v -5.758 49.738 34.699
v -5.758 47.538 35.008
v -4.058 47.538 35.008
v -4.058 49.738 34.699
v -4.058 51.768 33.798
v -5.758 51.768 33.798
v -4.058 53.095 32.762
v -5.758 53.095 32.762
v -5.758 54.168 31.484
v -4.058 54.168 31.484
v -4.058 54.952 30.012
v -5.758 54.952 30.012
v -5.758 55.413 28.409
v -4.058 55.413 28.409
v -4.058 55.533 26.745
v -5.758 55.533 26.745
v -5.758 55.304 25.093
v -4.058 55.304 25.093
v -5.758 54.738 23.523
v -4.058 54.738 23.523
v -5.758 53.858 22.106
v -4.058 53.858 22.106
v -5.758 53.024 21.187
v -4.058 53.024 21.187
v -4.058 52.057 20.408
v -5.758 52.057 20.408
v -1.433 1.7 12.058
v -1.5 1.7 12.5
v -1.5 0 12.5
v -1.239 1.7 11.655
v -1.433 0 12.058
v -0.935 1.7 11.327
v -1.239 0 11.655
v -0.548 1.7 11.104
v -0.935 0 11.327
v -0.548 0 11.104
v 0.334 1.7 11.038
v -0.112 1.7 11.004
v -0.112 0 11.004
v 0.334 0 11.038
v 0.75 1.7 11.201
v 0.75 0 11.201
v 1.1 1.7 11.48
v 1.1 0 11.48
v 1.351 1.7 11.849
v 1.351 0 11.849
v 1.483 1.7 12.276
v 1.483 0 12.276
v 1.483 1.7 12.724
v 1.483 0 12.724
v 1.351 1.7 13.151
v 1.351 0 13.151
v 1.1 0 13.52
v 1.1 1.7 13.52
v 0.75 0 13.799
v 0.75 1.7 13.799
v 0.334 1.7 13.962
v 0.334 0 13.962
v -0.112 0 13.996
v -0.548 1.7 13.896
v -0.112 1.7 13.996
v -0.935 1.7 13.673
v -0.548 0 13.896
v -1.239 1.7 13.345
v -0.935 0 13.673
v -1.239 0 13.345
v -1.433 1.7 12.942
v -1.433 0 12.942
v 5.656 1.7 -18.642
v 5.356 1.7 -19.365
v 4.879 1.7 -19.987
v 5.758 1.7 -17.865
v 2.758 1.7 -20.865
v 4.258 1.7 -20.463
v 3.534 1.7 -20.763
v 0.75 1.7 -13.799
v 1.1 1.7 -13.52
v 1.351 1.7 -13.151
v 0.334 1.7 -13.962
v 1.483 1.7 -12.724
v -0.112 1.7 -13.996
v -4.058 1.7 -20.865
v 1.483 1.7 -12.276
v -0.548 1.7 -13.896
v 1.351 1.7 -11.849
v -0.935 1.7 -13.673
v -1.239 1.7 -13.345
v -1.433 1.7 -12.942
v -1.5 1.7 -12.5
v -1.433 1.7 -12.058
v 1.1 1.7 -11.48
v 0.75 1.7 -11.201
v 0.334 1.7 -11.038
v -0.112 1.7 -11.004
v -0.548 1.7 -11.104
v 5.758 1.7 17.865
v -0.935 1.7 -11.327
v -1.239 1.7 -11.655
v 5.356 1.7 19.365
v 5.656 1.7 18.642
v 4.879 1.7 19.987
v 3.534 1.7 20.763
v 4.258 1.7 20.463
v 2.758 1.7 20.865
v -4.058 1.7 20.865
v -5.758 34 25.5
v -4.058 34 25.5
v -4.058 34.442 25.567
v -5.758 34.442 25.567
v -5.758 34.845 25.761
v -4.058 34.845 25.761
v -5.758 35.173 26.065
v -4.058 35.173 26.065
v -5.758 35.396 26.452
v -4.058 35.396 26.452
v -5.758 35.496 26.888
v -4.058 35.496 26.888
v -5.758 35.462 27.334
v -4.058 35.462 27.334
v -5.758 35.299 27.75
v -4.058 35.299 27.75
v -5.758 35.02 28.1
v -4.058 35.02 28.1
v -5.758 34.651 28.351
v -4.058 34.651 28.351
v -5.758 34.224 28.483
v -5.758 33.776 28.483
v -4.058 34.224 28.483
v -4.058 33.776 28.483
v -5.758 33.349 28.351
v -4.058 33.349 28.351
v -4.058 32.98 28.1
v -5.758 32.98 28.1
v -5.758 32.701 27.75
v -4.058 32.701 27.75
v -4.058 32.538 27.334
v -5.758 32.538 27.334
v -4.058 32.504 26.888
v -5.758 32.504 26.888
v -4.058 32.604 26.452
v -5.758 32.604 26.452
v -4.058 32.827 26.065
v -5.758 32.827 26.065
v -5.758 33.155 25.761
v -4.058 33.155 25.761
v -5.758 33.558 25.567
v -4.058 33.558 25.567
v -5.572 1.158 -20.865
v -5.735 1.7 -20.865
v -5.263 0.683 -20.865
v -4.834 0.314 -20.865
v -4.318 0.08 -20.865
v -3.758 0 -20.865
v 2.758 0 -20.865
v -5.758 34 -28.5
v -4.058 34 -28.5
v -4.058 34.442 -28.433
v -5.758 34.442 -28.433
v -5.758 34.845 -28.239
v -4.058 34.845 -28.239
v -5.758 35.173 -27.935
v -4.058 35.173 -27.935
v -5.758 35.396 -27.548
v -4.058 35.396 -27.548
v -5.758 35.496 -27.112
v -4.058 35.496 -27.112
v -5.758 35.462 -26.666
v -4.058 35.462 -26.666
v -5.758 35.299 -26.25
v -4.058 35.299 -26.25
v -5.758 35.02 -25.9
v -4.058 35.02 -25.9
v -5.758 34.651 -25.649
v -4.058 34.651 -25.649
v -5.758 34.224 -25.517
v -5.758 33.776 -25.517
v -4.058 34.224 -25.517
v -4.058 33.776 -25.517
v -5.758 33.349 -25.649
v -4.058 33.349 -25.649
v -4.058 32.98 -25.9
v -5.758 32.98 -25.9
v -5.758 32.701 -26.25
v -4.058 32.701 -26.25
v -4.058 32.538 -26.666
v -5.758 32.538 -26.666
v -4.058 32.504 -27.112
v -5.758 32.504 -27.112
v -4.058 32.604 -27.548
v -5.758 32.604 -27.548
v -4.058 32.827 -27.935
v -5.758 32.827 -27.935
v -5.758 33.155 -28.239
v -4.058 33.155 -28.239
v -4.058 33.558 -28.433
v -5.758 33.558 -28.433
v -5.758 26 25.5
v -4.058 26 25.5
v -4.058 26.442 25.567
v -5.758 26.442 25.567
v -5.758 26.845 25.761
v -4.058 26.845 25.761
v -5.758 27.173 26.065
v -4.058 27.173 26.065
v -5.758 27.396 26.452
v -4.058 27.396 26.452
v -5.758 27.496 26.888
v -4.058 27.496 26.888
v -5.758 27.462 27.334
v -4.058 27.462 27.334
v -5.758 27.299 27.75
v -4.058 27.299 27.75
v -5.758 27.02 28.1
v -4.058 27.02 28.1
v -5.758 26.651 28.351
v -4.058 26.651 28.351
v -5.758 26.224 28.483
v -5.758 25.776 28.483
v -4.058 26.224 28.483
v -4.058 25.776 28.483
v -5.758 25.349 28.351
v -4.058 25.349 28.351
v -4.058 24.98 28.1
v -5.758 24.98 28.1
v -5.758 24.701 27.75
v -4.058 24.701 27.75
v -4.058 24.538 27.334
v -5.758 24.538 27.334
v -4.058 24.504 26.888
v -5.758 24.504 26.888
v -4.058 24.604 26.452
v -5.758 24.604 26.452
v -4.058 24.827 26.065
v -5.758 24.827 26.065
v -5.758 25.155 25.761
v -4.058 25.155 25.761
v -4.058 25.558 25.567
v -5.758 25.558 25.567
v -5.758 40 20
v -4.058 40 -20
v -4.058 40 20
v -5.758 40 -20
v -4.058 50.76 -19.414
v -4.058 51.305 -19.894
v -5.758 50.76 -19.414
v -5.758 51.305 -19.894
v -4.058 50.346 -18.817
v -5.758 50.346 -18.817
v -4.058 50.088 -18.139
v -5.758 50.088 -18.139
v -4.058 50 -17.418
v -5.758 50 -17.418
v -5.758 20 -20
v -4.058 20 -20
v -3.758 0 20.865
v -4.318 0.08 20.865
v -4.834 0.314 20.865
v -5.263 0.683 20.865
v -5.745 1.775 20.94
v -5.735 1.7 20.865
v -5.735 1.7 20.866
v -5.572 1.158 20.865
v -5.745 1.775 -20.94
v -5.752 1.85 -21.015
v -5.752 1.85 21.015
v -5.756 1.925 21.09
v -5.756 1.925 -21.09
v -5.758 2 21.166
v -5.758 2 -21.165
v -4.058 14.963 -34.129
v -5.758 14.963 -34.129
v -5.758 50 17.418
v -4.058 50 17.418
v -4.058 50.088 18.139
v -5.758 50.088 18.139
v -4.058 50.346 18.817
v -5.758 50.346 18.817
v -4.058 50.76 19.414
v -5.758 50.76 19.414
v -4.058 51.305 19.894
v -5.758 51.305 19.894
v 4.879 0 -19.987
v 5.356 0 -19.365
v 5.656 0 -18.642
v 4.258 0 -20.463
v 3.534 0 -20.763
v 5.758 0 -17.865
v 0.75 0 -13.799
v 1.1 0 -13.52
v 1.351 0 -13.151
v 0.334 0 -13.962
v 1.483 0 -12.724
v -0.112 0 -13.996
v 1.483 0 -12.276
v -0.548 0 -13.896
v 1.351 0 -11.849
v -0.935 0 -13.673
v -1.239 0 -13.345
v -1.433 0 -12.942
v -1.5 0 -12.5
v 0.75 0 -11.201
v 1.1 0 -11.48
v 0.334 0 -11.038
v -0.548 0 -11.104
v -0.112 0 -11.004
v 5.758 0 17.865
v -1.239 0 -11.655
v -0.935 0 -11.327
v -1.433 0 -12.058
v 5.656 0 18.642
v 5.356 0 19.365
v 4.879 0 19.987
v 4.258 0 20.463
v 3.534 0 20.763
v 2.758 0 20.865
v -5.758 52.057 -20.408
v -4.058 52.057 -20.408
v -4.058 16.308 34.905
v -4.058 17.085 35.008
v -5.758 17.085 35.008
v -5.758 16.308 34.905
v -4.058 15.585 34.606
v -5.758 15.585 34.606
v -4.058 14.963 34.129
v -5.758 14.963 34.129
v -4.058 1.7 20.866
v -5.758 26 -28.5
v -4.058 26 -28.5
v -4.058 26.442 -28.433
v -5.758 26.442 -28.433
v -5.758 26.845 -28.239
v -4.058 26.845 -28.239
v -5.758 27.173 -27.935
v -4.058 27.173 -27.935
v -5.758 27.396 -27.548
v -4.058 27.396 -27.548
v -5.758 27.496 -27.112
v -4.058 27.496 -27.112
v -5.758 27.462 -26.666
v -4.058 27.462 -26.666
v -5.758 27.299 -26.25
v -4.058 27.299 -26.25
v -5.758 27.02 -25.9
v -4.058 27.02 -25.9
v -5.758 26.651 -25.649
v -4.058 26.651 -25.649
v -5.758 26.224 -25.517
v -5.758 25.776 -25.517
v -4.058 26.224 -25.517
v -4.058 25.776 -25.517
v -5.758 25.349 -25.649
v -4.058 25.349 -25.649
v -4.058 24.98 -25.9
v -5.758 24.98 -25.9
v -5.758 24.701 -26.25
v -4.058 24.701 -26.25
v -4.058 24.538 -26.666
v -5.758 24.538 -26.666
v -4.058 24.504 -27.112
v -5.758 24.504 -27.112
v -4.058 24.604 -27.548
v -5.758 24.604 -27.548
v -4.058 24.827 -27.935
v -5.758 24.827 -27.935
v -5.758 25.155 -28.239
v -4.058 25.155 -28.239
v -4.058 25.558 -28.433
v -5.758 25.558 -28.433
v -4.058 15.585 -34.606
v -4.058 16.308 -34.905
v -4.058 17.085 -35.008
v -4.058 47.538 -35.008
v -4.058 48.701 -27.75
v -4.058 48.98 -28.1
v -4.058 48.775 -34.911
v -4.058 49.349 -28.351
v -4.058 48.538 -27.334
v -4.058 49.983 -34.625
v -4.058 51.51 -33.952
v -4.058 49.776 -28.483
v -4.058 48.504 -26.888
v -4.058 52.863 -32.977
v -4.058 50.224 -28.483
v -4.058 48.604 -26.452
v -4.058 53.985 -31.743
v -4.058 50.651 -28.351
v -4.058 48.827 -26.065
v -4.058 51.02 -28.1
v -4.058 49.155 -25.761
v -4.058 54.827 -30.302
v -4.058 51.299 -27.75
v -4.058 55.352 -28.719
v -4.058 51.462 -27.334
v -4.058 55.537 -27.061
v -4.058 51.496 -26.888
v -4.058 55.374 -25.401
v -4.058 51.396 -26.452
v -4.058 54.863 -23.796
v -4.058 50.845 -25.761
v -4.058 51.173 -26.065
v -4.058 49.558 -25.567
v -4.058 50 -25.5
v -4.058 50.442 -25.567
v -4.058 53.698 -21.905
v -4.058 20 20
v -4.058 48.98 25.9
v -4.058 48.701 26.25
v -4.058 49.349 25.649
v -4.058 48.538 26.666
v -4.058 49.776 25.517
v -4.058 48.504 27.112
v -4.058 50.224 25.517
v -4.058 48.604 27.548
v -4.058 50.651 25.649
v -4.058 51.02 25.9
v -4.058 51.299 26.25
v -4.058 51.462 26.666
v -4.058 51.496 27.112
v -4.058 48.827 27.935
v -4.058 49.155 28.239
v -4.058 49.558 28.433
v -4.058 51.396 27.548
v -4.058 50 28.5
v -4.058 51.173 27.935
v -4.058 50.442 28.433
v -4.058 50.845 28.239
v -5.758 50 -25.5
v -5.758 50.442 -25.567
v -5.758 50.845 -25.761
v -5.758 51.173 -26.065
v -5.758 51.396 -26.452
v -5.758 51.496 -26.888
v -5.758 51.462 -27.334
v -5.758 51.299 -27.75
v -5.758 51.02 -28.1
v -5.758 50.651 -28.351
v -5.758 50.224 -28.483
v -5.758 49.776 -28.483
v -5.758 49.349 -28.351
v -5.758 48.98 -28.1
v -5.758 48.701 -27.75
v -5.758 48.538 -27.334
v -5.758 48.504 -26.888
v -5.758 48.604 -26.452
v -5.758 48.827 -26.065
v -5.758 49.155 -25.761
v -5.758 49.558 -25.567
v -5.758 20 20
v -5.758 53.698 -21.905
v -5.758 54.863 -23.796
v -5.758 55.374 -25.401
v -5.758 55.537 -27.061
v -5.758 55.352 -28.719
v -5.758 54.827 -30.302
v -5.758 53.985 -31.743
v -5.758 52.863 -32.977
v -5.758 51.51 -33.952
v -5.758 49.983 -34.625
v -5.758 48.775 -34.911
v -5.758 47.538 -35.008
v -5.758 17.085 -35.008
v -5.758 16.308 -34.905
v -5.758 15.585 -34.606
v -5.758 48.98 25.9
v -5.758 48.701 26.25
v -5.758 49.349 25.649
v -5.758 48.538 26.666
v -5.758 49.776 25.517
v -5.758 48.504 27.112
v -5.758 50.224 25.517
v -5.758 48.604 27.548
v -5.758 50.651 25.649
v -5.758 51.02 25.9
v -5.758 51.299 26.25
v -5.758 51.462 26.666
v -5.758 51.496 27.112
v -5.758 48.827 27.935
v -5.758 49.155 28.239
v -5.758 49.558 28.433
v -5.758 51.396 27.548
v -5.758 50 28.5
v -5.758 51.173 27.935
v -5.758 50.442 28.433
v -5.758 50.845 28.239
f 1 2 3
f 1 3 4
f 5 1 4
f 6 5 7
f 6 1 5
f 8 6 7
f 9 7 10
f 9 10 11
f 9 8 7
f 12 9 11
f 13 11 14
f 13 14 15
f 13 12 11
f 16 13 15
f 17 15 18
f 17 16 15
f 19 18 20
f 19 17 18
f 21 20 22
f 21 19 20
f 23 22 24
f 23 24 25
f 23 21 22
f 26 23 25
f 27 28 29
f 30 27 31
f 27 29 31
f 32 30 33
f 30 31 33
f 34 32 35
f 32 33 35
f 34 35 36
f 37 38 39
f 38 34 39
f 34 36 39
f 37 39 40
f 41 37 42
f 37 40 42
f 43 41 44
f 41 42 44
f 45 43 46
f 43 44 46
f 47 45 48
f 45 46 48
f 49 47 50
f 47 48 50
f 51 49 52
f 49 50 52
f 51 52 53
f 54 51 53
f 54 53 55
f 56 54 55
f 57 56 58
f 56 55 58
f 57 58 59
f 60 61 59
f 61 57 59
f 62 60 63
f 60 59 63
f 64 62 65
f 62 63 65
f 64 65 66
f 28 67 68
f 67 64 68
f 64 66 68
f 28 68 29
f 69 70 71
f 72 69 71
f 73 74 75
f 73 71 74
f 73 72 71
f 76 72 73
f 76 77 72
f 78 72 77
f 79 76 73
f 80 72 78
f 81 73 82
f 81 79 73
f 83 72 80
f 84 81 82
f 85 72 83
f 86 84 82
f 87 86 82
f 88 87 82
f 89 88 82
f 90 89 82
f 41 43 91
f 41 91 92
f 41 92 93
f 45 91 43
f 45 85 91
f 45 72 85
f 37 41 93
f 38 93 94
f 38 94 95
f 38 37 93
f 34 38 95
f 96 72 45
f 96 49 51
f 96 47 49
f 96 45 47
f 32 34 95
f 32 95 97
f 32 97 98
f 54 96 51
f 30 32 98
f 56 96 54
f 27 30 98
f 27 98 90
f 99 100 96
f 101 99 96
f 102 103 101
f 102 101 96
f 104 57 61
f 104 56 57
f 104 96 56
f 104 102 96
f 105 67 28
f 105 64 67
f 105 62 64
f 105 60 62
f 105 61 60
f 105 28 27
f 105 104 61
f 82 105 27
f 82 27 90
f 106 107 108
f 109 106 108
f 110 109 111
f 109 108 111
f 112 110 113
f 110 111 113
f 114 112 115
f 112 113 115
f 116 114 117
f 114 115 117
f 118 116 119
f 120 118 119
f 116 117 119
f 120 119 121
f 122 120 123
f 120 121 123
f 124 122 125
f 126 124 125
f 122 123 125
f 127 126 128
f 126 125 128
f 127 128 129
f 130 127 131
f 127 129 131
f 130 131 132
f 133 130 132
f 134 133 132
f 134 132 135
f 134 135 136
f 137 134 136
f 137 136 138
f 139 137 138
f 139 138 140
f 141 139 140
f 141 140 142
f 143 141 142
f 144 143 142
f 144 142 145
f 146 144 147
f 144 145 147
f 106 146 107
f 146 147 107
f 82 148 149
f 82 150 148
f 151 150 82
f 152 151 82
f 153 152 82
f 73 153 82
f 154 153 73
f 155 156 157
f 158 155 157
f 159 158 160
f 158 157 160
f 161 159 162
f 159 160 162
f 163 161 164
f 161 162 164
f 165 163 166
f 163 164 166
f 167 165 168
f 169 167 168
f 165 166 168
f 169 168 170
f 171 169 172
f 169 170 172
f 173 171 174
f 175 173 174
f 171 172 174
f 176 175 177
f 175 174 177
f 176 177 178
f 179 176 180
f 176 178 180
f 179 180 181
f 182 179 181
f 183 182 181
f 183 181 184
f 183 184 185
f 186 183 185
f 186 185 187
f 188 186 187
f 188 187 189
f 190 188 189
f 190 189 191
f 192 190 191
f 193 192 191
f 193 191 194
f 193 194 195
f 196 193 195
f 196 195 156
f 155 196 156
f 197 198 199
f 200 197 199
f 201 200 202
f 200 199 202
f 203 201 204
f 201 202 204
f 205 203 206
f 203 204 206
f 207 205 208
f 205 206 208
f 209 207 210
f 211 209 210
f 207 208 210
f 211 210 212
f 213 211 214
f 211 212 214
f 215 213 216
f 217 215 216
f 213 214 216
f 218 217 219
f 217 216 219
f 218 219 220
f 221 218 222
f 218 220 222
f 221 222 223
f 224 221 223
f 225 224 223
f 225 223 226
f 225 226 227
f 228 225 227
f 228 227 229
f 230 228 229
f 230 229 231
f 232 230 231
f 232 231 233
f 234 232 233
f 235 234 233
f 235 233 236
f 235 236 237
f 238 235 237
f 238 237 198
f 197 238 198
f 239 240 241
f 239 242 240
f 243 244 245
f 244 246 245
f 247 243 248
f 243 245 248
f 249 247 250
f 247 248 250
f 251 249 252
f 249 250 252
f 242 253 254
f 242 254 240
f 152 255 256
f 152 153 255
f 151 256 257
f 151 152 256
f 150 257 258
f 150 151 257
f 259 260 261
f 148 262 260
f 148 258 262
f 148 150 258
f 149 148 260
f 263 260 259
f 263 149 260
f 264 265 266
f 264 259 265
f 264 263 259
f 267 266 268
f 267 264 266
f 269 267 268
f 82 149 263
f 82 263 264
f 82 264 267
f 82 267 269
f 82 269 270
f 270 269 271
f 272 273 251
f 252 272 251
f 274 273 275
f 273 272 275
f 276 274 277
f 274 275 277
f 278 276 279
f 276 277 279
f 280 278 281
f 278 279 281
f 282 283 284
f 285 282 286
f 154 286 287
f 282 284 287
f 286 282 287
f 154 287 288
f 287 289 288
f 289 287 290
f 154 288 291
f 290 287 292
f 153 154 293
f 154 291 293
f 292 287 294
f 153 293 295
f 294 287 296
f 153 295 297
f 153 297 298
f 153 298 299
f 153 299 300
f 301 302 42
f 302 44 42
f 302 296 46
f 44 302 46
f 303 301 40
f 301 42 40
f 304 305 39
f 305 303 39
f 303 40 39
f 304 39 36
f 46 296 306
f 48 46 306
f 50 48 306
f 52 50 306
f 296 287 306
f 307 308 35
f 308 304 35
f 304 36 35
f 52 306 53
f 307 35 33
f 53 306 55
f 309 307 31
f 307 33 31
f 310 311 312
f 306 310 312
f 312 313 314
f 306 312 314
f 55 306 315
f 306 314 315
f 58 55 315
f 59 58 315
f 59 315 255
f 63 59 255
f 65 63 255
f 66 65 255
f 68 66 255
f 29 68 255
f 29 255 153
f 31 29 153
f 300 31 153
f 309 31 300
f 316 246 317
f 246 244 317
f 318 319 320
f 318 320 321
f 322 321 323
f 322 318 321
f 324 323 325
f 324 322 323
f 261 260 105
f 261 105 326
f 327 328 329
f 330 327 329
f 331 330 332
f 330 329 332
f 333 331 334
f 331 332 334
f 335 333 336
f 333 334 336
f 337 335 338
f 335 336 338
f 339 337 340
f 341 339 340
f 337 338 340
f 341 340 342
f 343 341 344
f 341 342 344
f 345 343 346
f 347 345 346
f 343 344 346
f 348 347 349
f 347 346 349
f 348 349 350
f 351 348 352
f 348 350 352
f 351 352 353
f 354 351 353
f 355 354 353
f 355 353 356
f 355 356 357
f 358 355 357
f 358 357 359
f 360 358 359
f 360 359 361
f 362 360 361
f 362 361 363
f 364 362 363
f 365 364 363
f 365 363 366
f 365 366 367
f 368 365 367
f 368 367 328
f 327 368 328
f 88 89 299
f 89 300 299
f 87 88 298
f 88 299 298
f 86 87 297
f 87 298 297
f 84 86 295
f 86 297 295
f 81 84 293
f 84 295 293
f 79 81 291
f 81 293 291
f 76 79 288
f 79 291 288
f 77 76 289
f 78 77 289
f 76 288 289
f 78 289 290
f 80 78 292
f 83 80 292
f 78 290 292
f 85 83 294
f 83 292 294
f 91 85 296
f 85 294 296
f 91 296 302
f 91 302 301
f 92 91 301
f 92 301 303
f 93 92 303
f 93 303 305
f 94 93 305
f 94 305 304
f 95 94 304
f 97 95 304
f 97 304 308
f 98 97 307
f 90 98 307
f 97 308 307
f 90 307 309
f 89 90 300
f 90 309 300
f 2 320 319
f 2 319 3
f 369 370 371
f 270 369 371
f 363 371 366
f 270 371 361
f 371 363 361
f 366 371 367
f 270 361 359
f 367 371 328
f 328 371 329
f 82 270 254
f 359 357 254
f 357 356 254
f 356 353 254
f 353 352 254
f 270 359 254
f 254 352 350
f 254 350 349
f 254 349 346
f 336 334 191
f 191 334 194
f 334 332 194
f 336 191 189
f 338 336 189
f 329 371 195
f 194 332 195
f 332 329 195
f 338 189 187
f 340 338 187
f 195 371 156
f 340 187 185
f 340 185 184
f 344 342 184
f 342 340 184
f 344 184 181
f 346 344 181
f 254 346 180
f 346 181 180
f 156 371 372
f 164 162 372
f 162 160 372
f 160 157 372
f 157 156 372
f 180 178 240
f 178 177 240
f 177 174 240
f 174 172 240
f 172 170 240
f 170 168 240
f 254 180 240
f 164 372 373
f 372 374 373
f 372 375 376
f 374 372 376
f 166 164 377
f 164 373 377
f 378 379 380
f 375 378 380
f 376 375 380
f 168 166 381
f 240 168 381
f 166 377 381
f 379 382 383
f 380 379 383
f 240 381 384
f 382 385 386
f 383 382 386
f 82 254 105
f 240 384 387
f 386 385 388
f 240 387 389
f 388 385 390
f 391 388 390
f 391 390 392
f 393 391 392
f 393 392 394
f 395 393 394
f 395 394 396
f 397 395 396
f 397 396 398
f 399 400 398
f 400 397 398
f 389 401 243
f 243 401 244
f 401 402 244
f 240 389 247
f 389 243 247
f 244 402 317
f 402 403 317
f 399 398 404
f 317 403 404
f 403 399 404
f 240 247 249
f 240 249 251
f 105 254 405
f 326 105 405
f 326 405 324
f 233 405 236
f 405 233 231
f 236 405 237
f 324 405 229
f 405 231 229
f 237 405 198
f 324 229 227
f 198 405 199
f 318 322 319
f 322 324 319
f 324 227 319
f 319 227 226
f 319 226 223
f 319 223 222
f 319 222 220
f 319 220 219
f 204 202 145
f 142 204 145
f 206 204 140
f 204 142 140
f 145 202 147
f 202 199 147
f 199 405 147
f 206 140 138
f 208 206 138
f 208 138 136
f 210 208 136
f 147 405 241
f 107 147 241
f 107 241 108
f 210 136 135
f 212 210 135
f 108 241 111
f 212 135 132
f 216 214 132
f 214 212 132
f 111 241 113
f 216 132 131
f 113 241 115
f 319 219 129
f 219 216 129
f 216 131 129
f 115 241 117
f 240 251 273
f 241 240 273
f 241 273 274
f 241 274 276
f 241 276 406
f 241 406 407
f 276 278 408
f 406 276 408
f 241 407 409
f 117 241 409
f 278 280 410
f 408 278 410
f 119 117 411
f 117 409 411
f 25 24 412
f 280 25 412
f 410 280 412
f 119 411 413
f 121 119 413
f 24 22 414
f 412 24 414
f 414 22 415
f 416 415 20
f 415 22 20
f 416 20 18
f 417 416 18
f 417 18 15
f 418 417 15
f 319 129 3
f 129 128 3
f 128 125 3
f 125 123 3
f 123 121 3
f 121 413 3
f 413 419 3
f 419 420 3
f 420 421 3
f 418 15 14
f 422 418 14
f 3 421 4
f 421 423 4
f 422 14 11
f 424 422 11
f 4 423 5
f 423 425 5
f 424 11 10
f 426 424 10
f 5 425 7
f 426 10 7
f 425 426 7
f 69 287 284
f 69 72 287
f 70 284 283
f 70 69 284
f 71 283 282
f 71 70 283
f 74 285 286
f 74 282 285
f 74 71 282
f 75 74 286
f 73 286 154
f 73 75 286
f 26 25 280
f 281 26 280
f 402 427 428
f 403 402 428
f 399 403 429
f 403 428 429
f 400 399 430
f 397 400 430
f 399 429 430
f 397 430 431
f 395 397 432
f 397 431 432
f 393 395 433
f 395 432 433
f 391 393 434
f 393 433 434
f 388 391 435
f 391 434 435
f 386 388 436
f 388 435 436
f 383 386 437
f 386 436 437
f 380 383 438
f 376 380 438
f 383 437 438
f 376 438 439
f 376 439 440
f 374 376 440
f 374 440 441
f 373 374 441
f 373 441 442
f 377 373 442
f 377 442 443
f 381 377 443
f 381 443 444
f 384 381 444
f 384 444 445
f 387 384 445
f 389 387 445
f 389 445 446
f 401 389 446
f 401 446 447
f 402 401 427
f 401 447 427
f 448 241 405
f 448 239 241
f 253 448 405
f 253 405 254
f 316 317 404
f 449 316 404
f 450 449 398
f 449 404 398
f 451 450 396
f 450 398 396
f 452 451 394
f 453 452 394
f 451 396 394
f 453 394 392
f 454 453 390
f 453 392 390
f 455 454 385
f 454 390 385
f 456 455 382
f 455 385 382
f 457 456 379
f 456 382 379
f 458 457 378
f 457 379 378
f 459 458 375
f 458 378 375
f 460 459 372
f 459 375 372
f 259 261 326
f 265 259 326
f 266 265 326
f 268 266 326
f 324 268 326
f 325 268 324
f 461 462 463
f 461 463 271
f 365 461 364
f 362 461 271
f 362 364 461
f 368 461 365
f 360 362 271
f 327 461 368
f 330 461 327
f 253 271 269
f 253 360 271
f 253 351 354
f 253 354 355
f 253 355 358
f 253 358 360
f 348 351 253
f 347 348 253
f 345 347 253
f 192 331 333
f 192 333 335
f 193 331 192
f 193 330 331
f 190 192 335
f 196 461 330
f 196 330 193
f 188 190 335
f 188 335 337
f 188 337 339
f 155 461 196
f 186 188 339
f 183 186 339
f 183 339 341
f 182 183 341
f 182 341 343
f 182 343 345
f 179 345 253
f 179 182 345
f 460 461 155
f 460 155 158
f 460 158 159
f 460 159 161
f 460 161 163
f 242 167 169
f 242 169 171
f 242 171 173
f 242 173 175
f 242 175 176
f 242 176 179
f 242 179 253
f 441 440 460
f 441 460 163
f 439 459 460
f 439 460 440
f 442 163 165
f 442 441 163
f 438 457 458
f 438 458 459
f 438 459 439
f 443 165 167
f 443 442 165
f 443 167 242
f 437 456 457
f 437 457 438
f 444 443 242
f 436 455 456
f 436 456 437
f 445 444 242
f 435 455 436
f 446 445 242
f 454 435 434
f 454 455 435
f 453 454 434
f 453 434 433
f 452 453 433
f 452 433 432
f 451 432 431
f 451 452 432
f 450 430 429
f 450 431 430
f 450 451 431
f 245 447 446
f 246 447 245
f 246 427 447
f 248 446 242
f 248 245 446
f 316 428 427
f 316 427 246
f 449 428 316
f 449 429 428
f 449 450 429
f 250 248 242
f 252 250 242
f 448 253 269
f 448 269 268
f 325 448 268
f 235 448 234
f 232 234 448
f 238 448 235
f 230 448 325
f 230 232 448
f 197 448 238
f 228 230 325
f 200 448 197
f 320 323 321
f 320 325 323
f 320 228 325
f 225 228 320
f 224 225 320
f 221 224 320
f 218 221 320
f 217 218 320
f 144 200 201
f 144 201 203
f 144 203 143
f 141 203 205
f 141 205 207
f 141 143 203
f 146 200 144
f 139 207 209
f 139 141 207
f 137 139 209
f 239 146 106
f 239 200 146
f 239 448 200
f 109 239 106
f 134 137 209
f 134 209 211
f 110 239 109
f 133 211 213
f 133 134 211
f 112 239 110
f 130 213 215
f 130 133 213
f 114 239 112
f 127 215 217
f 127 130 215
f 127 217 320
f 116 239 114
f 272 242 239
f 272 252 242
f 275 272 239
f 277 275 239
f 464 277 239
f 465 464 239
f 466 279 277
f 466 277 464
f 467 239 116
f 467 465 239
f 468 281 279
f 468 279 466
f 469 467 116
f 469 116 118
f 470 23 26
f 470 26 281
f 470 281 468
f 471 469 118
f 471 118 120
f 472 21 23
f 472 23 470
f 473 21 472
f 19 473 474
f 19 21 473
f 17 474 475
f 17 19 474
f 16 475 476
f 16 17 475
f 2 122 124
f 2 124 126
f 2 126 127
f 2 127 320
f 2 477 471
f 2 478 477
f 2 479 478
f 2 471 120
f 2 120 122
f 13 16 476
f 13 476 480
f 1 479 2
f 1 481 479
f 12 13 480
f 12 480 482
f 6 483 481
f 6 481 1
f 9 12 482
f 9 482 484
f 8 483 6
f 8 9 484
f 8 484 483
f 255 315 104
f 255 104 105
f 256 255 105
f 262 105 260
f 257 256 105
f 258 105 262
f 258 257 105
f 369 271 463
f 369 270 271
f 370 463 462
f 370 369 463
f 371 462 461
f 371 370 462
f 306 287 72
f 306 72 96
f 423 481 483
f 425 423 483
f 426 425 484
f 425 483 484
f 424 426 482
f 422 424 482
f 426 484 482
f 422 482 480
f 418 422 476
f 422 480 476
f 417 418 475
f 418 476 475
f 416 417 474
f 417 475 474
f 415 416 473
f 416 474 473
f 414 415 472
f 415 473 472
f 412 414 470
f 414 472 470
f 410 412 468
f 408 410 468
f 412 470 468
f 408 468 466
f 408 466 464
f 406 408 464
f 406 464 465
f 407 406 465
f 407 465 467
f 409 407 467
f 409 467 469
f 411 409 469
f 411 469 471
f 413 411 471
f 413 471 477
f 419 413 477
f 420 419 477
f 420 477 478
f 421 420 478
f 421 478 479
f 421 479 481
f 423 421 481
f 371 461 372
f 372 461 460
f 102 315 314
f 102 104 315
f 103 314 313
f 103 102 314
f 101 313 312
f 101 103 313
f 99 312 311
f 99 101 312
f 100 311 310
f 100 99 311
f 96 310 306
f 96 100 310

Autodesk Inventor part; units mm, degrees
ref_plane "YZ Plane" through (0, 0, 0) normal (1, 0, 0) x (0, 1, 0)
ref_plane "XZ Plane" through (0, 0, 0) normal (0, 1, 0) x (-1, 0, 0)
ref_plane "XY Plane" through (0, 0, 0) normal (0, 0, 1) x (1, 0, 0)
sketch "Sketch1" plane through (0, 0, 0) normal (0, 1, 0) x (-1, 0, 0)
  line L0 (0, 12.5) -> (0, -12.5) construction
  line L1 (-1.5, 12.5) -> (-1.5, -12.5)
  line L2 (1.5, -12.5) -> (1.5, 12.5)
  arc A0 (1.5, 12.5) -> (-1.5, 12.5) centre (0, 12.5) ccw
  arc A1 (-1.5, -12.5) -> (1.5, -12.5) centre (0, -12.5) ccw
  circle A2 centre (0, -12.5) radius 1.5
  circle A3 centre (0, 12.5) radius 1.5
  line L3 (-5.7579, 20.8654) -> (5.7579, 20.8654)
  line L4 (5.7579, 20.8654) -> (5.7579, -20.8654)
  line L5 (5.7579, -20.8654) -> (-5.7579, -20.8654)
  line L6 (-5.7579, -20.8654) -> (-5.7579, 20.8654)
  line L7 (-5.7579, 20.8654) -> (5.7579, -20.8654) construction
  line L8 (5.7579, 20.8654) -> (-5.7579, -20.8654) construction
  point P0 (0, 0)
  dimension "d0" = 12.5
  dimension "d1" = 3
  dimension "d2" = 3
  dimension "d3" = 3
extrude "Extrusion1" add sketch "Sketch1" along normal blind 1.7 contours A3 L2 A2 L1 | L3 L4 L5 L6
sketch "Sketch2" plane through (-5.7579, 0, -20.8654) normal (-1, 0, 0) x (0, 0, 1)
  line L0 (40.8654, 20) -> (0.8654, 20)
  line L1 (0.8654, 20) -> (0.8654, 40)
  line L2 (0.8654, 40) -> (40.8654, 40)
  line L3 (40.8654, 40) -> (40.8654, 20)
  line L4 (40.8654, 20) -> (0.8654, 40) construction
  line L5 (0.8654, 20) -> (40.8654, 40) construction
  line L6 (41.7309, 0) -> (0, 0) projected
  circle A0 centre (47.8654, 50) radius 1.5
  circle A1 centre (-6.1346, 50) radius 1.5
  line L7 (0, 1.7) -> (41.7309, 1.7) projected
  line L8 (41.7309, 1.7) -> (55.873, 15.8421)
  line L9 (41.7309, 1.7) -> (61.7309, 1.7) construction
  line L10 (55.873, 15.8421) -> (55.873, 55.8421)
  line L11 (55.873, 15.8421) -> (95.873, 15.8421) construction
  line L12 (0, 1.7) -> (-14.1421, 15.8421)
  line L13 (0, 1.7) -> (20, 1.7) construction
  line L14 (-14.1421, 15.8421) -> (-14.1421, 55.8421)
  line L15 (-14.1421, 55.8421) -> (55.873, 55.8421)
  point P0 (20.8654, 0)
  point P1 (20.8654, 30)
  dimension "d6" = 40
  dimension "d7" = 20
  dimension "d8" = 30
  dimension "d9" = 3
  dimension "d10" = 3
  dimension "d11" = 50
  dimension "d12" = 50
  dimension "d13" = 54
  dimension "d14" = 27
  dimension "d15" = 20
  dimension "d16" = 45
  dimension "d17" = 40
  dimension "d18" = 90
  dimension "d19" = 20
  dimension "d20" = 135
  dimension "d21" = 40
extrude "Extrusion2" add sketch "Sketch2" against normal blind 1.7
sketch "Sketch3" plane through (-4.0579, 0, -20.8654) normal (1, 0, 0) x (0, 0, -1)
  line L0 (-55.873, 55.8421) -> (14.1421, 55.8421) projected
  line L1 (-43.8654, 55.8421) -> (-39.8654, 50)
  line L2 (-39.8654, 50) -> (-1.8654, 50)
  line L3 (-1.8654, 50) -> (2.1346, 55.8421)
  line L4 (-40.8654, 40) -> (-0.8654, 40) projected
  circle A0 centre (-47.8654, 50) radius 1.5 projected
  circle A1 centre (6.1346, 50) radius 1.5 projected
  line L5 (14.1421, 55.8421) -> (-55.873, 55.8421) projected
  line L6 (-43.8654, 55.8421) -> (2.1346, 55.8421)
  point P0 (-20.8654, 0)
  point P1 (2.1346, 55.8421)
  dimension "d24" = 10
  dimension "d25" = 4
  dimension "d26" = 4
  dimension "d27" = 4
  dimension "d28" = 4
extrude "Extrusion3" cut sketch "Sketch3" against normal blind 10 contours L0 L3 L2 L1
fillet "Fillet1" radius 8 4 edges at (-4.9079, 55.8421, 35.0076) (-4.9079, 55.8421, 23) (-4.9079, 55.8421, -23) (-4.9079, 55.8421, -35.0076)
fillet "Fillet2" radius 3 2 edges at (-4.9079, 50, -19) (-4.9079, 50, 19)
fillet "Fillet3" radius 3 4 edges at (-4.9079, 15.8421, -35.0076) (5.7579, 0.85, -20.8654) (5.7579, 0.85, 20.8654) (-4.9079, 15.8421, 35.0076)
fillet "Fillet4" radius 2 1 edges at (-5.7579, 0, 0)
sketch "Sketch4" plane through (-4.0579, 0, -20.8654) normal (1, 0, 0) x (0, 0, -1)
  line L0 (-47.8654, 34) -> (6.1346, 34)
  line L1 (6.1346, 34) -> (6.1346, 26)
  line L2 (6.1346, 26) -> (-47.8654, 26)
  line L3 (-47.8654, 26) -> (-47.8654, 34)
  line L4 (-0.8654, 20) -> (-40.8654, 20) projected
  line L5 (-0.8654, 40) -> (-0.8654, 20) projected
  circle A0 centre (-47.8654, 34) radius 1.5
  circle A1 centre (-47.8654, 26) radius 1.5
  circle A2 centre (6.1346, 34) radius 1.5
  circle A3 centre (6.1346, 26) radius 1.5
  point P0 (-20.8654, 0)
  dimension "d35" = 54
  dimension "d36" = 8
  dimension "d37" = 6
  dimension "d38" = 7
  dimension "d39" = 3
  dimension "d40" = 3
  dimension "d41" = 3
  dimension "d42" = 3
extrude "Extrusion4" cut sketch "Sketch4" against normal blind 10 contours L3 A0 L0 | L0 A0 L3 | A1 L2 L3 | L3 L2 A1 | A2 L1 L0 | L0 L1 A2 | A3 L1 L2 | L2 L1 A3
properties part number "servo mount"
